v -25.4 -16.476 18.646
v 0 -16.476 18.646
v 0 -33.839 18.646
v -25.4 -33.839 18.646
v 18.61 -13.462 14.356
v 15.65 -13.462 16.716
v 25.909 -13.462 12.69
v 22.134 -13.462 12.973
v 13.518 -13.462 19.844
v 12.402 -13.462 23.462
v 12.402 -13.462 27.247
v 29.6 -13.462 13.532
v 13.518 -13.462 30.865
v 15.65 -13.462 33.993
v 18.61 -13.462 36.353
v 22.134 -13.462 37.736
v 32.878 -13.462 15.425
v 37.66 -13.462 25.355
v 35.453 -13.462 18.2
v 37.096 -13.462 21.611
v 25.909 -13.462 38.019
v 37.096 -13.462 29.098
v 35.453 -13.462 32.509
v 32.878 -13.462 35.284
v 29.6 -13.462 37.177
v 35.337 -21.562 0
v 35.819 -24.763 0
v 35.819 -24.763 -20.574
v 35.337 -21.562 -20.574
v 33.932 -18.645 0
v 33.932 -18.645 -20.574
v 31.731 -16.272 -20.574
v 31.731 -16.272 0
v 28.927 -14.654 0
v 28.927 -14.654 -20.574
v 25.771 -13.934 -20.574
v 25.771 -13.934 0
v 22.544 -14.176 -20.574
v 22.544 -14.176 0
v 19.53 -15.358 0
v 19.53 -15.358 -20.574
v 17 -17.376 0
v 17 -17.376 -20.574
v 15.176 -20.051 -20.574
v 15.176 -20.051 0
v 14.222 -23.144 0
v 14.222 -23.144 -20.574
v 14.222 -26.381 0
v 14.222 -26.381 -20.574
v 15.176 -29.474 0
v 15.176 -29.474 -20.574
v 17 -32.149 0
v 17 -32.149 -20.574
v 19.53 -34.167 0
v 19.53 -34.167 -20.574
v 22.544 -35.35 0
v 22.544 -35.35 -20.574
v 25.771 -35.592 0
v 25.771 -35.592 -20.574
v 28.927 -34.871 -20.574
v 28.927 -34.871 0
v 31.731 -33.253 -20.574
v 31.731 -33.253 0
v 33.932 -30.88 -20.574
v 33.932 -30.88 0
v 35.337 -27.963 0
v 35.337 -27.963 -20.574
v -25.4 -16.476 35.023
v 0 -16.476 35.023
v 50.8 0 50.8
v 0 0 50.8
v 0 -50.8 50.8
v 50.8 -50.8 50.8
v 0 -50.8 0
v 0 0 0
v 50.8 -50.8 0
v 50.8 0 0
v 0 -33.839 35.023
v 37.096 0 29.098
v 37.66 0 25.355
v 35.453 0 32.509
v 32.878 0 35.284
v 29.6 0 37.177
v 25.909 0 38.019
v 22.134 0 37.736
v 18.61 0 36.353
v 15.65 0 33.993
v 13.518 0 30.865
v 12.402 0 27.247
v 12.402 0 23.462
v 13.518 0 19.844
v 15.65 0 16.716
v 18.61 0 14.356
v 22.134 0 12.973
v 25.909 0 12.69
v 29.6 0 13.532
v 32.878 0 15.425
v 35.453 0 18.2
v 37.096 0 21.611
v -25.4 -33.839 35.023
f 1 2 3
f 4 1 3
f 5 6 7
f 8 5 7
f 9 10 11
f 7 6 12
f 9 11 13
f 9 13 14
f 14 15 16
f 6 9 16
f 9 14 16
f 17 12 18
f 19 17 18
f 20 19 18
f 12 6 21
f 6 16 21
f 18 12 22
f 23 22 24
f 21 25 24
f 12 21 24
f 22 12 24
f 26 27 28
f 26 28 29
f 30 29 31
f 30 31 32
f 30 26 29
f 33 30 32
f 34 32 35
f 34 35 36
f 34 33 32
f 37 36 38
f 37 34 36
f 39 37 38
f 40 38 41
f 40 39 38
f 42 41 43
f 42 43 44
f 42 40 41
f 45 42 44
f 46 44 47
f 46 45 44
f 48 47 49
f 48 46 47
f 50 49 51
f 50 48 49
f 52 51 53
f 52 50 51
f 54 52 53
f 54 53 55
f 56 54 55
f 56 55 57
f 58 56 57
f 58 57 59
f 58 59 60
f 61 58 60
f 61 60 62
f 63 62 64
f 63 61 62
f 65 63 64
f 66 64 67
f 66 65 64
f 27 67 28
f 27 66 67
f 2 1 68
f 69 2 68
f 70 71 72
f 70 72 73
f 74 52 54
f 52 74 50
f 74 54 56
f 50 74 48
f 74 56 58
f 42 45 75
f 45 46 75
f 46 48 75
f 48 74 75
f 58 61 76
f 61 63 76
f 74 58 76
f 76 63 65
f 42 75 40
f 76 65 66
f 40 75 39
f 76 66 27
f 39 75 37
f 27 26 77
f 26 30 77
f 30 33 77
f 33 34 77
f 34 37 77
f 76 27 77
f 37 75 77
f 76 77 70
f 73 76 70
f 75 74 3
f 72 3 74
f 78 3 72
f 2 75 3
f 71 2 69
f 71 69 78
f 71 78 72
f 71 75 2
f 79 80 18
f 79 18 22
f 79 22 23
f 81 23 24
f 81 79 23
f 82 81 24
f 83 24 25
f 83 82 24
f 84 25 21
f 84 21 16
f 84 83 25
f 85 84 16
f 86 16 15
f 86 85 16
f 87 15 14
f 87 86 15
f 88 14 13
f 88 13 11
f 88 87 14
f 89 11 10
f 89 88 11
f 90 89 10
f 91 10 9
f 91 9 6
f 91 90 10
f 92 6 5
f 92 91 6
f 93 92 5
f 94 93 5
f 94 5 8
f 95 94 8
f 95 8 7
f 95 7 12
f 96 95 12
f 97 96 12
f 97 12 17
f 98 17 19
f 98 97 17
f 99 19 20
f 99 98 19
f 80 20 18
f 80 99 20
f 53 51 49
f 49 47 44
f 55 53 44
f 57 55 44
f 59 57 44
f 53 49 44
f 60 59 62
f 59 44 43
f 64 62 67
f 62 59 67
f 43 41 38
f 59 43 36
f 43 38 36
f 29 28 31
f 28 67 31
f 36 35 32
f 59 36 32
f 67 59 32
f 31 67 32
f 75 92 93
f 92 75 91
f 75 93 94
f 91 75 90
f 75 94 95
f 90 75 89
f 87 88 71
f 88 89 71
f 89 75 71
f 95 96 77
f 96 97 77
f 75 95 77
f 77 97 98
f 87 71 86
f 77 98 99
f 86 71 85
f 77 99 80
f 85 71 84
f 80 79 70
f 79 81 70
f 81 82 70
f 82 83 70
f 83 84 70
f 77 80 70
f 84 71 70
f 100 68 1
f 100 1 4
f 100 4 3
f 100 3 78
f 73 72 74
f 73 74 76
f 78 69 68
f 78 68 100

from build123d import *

# Parameters (mm, degrees)
F0_W     = 50.8
F0_H     = 50.8
F1_DEPTH = 50.8
F2_R     = 12.7
F3_DEPTH = 13.462
F4_R     = 10.859331
F5_DEPTH = 20.574
F6_W     = 17.36345
F6_H     = 16.376892
F7_DEPTH = 25.4


with BuildPart() as f1:
    # F0 (on Front) → F1 (new body)
    with BuildSketch(Plane.XZ):
        with Locations((25.4, 25.4)):
            Rectangle(F0_W, F0_H)
    extrude(amount=F1_DEPTH)

    # F2 (on Front) → F3 (cut)
    with BuildSketch(Plane.XZ):
        with Locations((24.959963, 25.354587)):
            Circle(F2_R)
    extrude(amount=F3_DEPTH, mode=Mode.SUBTRACT)

    # F4 (on Top) → F5 (join)
    with BuildSketch(Plane.XY):
        with Locations((24.959963, -24.762653)):
            Circle(F4_R)
    extrude(amount=-F5_DEPTH)

    # F6 (on face) → F7 (join)
    with BuildSketch(Plane(origin=(0, 0, 0), x_dir=(0, -1, 0), z_dir=(-1, 0, 0))):
        with Locations((25.157274, 26.834427)):
            Rectangle(F6_W, F6_H)
    extrude(amount=F7_DEPTH)


solid = f1.part
